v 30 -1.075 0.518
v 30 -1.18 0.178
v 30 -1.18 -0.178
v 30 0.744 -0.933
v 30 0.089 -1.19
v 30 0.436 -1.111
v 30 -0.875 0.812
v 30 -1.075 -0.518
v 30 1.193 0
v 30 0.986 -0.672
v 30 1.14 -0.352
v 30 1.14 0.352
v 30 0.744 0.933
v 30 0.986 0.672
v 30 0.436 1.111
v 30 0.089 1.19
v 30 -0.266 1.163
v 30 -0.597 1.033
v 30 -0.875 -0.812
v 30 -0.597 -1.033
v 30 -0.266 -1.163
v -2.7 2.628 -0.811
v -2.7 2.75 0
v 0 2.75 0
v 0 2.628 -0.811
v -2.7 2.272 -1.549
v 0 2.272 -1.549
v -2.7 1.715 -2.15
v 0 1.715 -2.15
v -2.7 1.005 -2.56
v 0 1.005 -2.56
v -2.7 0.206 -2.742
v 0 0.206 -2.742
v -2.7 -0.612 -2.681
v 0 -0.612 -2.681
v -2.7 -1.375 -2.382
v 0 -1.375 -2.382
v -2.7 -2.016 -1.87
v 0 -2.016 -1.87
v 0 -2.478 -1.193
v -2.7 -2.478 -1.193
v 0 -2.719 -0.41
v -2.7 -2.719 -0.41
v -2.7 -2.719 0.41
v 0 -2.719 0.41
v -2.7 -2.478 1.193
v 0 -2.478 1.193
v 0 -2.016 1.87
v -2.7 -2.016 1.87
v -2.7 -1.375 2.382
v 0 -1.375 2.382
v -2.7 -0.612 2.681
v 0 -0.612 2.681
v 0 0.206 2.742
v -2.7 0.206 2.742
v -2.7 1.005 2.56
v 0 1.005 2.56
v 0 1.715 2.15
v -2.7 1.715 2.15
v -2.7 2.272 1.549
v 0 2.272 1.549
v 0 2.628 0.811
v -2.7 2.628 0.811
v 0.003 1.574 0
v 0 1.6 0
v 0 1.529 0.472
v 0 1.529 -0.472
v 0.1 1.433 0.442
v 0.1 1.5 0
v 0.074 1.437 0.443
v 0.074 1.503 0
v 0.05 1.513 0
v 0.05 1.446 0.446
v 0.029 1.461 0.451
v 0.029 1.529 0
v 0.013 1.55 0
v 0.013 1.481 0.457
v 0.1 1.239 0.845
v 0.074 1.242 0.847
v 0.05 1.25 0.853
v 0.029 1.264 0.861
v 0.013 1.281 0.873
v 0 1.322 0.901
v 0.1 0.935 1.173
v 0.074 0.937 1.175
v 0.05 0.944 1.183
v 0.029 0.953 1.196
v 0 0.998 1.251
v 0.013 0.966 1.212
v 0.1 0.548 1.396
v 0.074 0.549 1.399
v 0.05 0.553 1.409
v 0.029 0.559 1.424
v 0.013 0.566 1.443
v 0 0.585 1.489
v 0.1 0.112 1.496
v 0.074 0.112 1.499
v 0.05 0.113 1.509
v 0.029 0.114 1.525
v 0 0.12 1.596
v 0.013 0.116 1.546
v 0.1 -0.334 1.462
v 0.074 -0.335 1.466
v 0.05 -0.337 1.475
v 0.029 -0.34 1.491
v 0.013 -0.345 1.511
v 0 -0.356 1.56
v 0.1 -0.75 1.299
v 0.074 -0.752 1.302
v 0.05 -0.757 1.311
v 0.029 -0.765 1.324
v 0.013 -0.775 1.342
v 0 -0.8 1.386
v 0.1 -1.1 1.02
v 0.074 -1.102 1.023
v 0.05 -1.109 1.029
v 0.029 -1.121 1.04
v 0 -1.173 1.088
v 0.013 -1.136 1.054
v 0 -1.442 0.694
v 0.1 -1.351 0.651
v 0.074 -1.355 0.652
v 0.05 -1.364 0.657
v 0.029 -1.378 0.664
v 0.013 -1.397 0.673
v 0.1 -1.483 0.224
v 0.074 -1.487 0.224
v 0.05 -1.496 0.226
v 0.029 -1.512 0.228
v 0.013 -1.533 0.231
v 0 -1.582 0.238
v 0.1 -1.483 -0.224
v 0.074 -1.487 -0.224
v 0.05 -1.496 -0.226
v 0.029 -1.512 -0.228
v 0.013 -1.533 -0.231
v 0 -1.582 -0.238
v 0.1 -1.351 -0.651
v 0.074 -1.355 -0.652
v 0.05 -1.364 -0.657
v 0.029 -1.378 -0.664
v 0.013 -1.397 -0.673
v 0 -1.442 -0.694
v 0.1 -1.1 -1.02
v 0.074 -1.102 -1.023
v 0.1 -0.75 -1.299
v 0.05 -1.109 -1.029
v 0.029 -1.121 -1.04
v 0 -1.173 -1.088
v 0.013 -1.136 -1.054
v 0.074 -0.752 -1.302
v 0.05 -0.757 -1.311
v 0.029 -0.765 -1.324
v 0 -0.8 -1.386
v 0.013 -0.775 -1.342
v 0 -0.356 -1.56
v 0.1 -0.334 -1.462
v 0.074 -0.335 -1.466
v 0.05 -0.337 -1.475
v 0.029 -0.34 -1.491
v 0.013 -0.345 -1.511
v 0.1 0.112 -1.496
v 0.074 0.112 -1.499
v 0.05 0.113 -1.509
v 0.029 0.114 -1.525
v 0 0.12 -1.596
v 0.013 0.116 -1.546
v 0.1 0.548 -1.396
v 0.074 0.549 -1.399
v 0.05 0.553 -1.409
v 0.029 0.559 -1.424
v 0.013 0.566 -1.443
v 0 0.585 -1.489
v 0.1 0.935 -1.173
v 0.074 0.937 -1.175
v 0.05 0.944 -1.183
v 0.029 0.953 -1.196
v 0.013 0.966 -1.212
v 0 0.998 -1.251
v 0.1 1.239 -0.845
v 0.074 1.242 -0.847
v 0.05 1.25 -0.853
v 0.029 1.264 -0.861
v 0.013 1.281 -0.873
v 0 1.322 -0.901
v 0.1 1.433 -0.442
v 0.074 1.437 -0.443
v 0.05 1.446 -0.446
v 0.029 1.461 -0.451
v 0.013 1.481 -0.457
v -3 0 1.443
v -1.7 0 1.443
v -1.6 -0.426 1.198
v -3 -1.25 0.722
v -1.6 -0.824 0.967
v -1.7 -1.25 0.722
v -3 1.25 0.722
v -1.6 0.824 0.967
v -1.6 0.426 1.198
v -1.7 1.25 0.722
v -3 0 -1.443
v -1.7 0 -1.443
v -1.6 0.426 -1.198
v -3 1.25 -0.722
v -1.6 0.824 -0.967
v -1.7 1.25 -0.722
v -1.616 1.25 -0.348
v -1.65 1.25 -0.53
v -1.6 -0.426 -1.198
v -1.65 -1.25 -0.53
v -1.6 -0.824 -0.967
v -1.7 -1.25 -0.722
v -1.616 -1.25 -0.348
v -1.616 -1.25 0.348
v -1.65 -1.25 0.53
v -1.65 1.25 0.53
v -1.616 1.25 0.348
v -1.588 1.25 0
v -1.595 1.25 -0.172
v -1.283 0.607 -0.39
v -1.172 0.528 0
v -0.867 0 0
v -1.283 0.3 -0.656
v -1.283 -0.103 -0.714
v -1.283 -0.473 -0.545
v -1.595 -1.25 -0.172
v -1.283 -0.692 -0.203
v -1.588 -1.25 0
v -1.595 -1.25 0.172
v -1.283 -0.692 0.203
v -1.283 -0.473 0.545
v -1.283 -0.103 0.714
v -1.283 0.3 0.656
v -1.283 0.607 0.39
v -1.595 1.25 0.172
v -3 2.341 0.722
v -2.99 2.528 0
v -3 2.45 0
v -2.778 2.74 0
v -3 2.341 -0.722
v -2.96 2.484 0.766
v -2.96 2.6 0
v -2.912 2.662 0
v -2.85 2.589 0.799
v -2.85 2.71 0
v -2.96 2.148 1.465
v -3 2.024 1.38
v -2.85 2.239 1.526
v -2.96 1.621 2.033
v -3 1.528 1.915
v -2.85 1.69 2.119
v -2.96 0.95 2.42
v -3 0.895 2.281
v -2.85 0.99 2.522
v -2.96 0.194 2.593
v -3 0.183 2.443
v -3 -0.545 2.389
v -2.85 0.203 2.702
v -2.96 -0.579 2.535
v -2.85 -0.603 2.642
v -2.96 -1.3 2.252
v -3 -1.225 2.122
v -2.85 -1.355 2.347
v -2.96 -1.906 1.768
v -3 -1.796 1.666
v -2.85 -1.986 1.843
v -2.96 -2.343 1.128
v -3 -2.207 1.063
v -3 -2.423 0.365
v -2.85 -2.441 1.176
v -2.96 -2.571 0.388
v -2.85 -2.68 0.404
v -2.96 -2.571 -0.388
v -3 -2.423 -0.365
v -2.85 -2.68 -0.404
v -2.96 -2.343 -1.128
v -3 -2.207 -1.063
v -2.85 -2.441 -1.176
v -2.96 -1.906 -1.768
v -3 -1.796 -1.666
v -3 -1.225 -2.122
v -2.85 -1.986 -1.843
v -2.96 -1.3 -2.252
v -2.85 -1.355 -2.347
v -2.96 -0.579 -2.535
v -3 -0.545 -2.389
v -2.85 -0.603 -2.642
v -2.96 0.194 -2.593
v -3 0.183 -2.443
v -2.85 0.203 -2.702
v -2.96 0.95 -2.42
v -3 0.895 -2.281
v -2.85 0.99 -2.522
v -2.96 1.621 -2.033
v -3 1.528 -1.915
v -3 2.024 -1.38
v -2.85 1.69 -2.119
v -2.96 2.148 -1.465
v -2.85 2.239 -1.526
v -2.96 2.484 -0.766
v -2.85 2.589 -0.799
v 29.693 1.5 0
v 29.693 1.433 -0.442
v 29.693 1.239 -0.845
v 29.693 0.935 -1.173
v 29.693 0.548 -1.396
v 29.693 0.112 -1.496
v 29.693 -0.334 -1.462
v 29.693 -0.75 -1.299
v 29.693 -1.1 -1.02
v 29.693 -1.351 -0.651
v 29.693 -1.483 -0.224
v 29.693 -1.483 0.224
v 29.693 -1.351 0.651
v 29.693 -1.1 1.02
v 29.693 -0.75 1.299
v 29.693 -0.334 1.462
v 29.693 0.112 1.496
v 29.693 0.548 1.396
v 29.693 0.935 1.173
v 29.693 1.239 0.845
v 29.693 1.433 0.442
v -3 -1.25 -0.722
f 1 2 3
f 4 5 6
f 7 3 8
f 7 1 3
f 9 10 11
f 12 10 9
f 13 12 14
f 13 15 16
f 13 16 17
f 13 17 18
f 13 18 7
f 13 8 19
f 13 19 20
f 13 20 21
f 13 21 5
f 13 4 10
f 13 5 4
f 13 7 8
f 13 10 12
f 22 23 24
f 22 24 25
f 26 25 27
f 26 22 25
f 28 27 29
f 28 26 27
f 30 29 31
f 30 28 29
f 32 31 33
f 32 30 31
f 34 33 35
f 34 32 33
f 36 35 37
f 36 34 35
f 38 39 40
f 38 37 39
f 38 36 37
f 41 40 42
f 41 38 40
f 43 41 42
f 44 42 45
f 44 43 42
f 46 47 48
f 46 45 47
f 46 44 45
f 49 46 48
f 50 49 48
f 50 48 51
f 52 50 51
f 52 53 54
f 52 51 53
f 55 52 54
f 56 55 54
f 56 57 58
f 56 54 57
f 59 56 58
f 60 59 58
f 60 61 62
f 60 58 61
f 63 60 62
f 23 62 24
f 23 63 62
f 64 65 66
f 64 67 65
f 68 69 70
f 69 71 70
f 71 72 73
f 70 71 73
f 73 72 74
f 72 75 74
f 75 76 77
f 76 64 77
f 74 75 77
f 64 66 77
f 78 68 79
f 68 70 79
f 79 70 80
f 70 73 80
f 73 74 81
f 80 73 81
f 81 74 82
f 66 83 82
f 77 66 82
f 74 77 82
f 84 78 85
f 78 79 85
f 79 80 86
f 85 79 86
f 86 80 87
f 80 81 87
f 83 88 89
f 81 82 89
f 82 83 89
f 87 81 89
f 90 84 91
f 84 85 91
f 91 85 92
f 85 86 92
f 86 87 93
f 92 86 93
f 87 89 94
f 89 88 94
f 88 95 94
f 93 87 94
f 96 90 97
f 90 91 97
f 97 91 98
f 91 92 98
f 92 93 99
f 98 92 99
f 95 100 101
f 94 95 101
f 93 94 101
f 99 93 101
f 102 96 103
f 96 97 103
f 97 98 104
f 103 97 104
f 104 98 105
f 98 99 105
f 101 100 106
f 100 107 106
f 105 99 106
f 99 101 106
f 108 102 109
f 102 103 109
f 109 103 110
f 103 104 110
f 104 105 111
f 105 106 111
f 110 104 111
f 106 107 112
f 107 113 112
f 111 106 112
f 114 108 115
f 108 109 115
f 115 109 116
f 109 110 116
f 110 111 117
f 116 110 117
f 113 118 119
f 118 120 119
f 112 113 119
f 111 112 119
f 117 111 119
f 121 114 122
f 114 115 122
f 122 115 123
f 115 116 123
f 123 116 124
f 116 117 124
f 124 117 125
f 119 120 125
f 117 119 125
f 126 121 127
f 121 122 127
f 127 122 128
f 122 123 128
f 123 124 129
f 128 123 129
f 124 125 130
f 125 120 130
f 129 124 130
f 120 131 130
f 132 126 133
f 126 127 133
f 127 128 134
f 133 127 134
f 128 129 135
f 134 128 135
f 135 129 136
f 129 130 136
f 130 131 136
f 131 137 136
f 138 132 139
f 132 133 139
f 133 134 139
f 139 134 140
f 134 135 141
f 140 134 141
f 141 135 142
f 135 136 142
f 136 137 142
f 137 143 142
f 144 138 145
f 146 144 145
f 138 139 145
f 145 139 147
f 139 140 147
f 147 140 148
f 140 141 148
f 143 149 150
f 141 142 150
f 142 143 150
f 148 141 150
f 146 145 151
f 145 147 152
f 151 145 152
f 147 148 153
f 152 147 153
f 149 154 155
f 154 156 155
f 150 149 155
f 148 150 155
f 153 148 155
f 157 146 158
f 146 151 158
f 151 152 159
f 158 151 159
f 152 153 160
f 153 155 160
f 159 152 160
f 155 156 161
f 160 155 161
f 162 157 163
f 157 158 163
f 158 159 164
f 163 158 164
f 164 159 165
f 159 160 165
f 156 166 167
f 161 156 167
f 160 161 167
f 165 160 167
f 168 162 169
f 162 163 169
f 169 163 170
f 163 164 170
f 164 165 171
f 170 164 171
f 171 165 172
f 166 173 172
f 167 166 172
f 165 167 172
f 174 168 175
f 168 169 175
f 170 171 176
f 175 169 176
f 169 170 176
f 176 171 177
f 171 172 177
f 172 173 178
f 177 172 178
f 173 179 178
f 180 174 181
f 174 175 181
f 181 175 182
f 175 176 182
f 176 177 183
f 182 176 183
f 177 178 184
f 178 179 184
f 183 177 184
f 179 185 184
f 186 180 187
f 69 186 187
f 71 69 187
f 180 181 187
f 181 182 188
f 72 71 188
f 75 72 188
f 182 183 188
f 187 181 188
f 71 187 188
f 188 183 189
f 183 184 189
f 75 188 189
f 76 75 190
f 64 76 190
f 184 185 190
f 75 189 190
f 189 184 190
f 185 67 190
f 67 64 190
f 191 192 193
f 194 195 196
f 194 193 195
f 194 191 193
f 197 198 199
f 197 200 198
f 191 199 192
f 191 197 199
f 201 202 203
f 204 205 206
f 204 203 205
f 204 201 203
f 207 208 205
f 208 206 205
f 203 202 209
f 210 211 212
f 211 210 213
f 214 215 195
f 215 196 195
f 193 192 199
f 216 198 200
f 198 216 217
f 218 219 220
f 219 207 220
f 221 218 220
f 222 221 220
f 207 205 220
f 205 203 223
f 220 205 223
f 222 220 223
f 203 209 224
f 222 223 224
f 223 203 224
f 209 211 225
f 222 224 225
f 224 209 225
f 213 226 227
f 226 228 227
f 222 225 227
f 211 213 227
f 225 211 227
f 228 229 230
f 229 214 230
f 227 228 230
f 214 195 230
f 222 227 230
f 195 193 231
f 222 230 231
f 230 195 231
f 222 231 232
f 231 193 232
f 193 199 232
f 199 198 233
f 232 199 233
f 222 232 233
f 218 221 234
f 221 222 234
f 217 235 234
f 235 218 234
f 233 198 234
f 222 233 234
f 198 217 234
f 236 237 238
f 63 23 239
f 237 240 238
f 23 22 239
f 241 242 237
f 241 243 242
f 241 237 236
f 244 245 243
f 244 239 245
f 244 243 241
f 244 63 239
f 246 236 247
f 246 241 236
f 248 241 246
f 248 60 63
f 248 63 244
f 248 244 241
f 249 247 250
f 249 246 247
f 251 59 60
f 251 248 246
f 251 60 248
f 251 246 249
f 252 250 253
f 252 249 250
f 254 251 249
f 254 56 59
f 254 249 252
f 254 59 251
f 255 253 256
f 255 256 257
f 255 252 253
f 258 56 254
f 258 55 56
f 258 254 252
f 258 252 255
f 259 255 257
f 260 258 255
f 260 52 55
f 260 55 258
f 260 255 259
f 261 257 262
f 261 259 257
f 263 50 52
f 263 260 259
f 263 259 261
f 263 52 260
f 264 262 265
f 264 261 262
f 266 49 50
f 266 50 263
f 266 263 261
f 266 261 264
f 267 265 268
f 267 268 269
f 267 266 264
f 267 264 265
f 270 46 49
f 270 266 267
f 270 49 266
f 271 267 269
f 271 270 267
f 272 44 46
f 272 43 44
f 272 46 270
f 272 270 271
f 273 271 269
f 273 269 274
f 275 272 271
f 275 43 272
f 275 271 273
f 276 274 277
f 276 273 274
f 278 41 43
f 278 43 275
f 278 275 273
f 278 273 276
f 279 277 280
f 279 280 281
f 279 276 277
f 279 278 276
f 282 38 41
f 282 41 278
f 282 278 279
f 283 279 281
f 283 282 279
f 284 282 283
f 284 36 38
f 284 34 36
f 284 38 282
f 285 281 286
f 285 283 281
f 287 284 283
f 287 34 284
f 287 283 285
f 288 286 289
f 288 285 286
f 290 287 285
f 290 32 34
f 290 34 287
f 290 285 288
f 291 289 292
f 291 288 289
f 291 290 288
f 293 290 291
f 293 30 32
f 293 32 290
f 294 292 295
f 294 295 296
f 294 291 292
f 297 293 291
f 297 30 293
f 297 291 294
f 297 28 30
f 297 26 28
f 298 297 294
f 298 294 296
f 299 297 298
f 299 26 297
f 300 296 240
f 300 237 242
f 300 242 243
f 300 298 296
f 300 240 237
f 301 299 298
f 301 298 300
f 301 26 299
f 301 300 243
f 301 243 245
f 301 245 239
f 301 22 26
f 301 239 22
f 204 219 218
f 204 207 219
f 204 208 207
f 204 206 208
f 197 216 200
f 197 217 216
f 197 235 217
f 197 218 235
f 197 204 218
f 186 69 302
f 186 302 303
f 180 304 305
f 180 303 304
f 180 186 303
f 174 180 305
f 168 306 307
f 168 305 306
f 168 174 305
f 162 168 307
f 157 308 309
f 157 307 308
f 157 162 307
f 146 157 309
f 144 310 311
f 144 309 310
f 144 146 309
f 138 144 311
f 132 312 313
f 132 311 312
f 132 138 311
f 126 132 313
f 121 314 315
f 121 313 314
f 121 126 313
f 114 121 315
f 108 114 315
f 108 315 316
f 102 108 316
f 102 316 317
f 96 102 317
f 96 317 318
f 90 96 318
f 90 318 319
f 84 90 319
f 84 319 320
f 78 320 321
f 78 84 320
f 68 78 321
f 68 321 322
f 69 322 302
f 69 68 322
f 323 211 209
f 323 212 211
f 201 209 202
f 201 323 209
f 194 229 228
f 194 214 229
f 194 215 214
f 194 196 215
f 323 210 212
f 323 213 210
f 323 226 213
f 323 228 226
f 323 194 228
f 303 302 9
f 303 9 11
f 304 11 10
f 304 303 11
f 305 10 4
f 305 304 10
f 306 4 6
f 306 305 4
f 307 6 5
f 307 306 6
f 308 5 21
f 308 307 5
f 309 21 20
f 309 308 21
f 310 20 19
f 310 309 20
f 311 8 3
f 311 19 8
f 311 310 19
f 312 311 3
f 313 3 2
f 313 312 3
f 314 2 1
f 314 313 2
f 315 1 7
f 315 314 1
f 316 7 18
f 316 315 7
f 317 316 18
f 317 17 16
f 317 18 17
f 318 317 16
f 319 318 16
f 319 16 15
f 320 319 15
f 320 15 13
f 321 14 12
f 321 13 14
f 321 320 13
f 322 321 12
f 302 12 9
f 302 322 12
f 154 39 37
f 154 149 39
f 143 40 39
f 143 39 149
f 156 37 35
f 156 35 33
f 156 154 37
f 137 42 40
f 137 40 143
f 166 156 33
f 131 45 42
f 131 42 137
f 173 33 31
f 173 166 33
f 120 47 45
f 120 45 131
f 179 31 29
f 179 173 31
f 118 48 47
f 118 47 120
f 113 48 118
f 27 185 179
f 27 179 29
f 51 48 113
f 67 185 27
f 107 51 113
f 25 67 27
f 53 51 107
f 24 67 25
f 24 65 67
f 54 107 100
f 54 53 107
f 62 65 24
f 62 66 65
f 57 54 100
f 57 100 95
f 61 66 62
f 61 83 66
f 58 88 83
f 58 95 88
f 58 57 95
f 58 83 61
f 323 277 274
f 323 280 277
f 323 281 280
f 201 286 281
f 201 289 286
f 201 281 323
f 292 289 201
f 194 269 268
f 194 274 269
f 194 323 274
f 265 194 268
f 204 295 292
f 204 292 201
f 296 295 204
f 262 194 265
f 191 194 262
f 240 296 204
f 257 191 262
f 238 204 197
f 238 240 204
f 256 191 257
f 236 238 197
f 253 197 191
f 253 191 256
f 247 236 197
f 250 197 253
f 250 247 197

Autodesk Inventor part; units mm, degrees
ref_plane "YZ Plane" through (0, 0, 0) normal (1, 0, 0) x (0, 1, 0)
ref_plane "XZ Plane" through (0, 0, 0) normal (0, 1, 0) x (-1, 0, 0)
sketch "Sketch1" plane through (0, 0, 0) normal (0, 0, 1) x (1, 0, 0)
  line L0 (-0.8667, 0) -> (30, 0)
  line L1 (30, 0) -> (30, 1.5)
  line L2 (30, 1.5) -> (23.25, 1.5)
  line L3 (23.25, 1.5) -> (22.9432, 1.5)
  line L4 (22.9432, 1.5) -> (0, 1.5)
  line L5 (0, 1.5) -> (0, 2.75)
  line L6 (0, 2.75) -> (-3, 2.75)
  line L7 (-3, 2.75) -> (-3, 1.4434)
  line L8 (-3, 1.4434) -> (-1.7, 1.4434)
  line L9 (-1.7, 1.4434) -> (-0.8667, 0)
  line L10 (-9.6, 0) -> (36.6, 0) projected
  line L11 (0, -0.55) -> (0, 3.3) projected
  line L12 (23.25, 1.5) -> (0, 1.5) construction
  dimension "d1" = 6.75
  dimension "d2" = 0.3068
  dimension "d3" = 3
  dimension "d4" = 1.3
  dimension "d5" = 60
  dimension "d6" = 3
  dimension "d7" = 3
  dimension "d8" = 2.8868
  dimension "d9" = 5.5
  dimension "d26" = 30
revolve "Body" add sketch "Sketch1" angle 360 about axis through (-0.8667, 0, 0) along (1, 0, 0)
sketch "Sketch2" plane through (-3, 0, 0) normal (-1, 0, 0) x (0, 0, 1)
  circle A0 centre (0, 0) radius 1.4434 projected
  line L0 (0, -3.85) -> (0, 3.85) projected
  line L1 (-3.85, 0) -> (3.85, 0) projected
  line L2 (1.4434, 0) -> (0.7217, -1.25)
  line L3 (0.7217, -1.25) -> (-0.7217, -1.25)
  line L4 (-0.7217, -1.25) -> (-1.4434, 0)
  line L5 (-1.4434, 0) -> (-0.7217, 1.25)
  line L6 (-0.7217, 1.25) -> (0.7217, 1.25)
  line L7 (0.7217, 1.25) -> (1.4434, 0)
extrude "Slot" add sketch "Sketch2" against normal up to next contours L7 A0 | A0 L2 | L6 L0 A0 | A0 L0 L3 | L0 L6 A0 | A0 L3 L0 | L4 A0 | A0 L5
fillet "Fillet1" radius 0.3 1 edges at (-3, -2.75, 0)
thread "Thread" size "M3x0.5" class "6g" standard "ISO Metric profile" length 6.75
chamfer "Chamfer1" distance 0.3067 distance2 0.3067 1 edges at (30, -1.5, 0) measured on face at (30, -0.3888, 0.2119)
ref_plane "Work Plane1" through (29, 0, 0) normal (0, -1, 0) x (1, 0, 0)
fillet "Fillet2" radius 0.1 1 edges at (0, -1.5, 0)
equation "\"d1\" = GEL"
equation "\"d3\" = KOH"
equation "\"d4\" = INTI"
equation "\"d6\" = GD"
equation "\"d7\" = BDM"
equation "\"d8\" = 1.1547 * SW"
equation "\"d9\" = KOD"
equation "\"d17\" = RR"
equation "\"d13\" = GEL"
equation "\"d15\" = -0.5 * SPD + 0.5 * GD"
equation "\"d16\" = GUL"
equation "\"d30\" = R"
equation "\"GD\" = NND"
equation "\"NLG\" = 8"
equation "\"GEL\" = 6.75"
equation "\"KOD\" = 5.5"
equation "\"KOH\" = NND"
equation "\"INTI\" = 1.3"
equation "\"GAL\" = 0.61345 * PTC"
equation "\"GUL\" = 0.61345 * PTC"
equation "\"BDM\" = NND"
equation "\"SW\" = 2.5"
equation "\"RR\" = 0.1 * NND"
equation "\"SPD\" = NND - 1.2269 * PTC"
equation "\"R\" = 0.1"
equation "\"PHH\" = 0.13"
equation "\"GD1\" = THREADDIA - 1.2269 * PTC"
equation "\"THREADDIA\" = 3"
equation "\"FAWI\" = 45deg"
equation "\"PTC\" = 0.5"
equation "\"KOH1\" = 2.7"
equation "\"NND\" = 3"
equation "\"TOA\" = 30deg"
equation "\"E0\" = 1.155 * SW"
properties part number "AS 1420 - 1973 - M3 x 8" material "Steel, Mild"
